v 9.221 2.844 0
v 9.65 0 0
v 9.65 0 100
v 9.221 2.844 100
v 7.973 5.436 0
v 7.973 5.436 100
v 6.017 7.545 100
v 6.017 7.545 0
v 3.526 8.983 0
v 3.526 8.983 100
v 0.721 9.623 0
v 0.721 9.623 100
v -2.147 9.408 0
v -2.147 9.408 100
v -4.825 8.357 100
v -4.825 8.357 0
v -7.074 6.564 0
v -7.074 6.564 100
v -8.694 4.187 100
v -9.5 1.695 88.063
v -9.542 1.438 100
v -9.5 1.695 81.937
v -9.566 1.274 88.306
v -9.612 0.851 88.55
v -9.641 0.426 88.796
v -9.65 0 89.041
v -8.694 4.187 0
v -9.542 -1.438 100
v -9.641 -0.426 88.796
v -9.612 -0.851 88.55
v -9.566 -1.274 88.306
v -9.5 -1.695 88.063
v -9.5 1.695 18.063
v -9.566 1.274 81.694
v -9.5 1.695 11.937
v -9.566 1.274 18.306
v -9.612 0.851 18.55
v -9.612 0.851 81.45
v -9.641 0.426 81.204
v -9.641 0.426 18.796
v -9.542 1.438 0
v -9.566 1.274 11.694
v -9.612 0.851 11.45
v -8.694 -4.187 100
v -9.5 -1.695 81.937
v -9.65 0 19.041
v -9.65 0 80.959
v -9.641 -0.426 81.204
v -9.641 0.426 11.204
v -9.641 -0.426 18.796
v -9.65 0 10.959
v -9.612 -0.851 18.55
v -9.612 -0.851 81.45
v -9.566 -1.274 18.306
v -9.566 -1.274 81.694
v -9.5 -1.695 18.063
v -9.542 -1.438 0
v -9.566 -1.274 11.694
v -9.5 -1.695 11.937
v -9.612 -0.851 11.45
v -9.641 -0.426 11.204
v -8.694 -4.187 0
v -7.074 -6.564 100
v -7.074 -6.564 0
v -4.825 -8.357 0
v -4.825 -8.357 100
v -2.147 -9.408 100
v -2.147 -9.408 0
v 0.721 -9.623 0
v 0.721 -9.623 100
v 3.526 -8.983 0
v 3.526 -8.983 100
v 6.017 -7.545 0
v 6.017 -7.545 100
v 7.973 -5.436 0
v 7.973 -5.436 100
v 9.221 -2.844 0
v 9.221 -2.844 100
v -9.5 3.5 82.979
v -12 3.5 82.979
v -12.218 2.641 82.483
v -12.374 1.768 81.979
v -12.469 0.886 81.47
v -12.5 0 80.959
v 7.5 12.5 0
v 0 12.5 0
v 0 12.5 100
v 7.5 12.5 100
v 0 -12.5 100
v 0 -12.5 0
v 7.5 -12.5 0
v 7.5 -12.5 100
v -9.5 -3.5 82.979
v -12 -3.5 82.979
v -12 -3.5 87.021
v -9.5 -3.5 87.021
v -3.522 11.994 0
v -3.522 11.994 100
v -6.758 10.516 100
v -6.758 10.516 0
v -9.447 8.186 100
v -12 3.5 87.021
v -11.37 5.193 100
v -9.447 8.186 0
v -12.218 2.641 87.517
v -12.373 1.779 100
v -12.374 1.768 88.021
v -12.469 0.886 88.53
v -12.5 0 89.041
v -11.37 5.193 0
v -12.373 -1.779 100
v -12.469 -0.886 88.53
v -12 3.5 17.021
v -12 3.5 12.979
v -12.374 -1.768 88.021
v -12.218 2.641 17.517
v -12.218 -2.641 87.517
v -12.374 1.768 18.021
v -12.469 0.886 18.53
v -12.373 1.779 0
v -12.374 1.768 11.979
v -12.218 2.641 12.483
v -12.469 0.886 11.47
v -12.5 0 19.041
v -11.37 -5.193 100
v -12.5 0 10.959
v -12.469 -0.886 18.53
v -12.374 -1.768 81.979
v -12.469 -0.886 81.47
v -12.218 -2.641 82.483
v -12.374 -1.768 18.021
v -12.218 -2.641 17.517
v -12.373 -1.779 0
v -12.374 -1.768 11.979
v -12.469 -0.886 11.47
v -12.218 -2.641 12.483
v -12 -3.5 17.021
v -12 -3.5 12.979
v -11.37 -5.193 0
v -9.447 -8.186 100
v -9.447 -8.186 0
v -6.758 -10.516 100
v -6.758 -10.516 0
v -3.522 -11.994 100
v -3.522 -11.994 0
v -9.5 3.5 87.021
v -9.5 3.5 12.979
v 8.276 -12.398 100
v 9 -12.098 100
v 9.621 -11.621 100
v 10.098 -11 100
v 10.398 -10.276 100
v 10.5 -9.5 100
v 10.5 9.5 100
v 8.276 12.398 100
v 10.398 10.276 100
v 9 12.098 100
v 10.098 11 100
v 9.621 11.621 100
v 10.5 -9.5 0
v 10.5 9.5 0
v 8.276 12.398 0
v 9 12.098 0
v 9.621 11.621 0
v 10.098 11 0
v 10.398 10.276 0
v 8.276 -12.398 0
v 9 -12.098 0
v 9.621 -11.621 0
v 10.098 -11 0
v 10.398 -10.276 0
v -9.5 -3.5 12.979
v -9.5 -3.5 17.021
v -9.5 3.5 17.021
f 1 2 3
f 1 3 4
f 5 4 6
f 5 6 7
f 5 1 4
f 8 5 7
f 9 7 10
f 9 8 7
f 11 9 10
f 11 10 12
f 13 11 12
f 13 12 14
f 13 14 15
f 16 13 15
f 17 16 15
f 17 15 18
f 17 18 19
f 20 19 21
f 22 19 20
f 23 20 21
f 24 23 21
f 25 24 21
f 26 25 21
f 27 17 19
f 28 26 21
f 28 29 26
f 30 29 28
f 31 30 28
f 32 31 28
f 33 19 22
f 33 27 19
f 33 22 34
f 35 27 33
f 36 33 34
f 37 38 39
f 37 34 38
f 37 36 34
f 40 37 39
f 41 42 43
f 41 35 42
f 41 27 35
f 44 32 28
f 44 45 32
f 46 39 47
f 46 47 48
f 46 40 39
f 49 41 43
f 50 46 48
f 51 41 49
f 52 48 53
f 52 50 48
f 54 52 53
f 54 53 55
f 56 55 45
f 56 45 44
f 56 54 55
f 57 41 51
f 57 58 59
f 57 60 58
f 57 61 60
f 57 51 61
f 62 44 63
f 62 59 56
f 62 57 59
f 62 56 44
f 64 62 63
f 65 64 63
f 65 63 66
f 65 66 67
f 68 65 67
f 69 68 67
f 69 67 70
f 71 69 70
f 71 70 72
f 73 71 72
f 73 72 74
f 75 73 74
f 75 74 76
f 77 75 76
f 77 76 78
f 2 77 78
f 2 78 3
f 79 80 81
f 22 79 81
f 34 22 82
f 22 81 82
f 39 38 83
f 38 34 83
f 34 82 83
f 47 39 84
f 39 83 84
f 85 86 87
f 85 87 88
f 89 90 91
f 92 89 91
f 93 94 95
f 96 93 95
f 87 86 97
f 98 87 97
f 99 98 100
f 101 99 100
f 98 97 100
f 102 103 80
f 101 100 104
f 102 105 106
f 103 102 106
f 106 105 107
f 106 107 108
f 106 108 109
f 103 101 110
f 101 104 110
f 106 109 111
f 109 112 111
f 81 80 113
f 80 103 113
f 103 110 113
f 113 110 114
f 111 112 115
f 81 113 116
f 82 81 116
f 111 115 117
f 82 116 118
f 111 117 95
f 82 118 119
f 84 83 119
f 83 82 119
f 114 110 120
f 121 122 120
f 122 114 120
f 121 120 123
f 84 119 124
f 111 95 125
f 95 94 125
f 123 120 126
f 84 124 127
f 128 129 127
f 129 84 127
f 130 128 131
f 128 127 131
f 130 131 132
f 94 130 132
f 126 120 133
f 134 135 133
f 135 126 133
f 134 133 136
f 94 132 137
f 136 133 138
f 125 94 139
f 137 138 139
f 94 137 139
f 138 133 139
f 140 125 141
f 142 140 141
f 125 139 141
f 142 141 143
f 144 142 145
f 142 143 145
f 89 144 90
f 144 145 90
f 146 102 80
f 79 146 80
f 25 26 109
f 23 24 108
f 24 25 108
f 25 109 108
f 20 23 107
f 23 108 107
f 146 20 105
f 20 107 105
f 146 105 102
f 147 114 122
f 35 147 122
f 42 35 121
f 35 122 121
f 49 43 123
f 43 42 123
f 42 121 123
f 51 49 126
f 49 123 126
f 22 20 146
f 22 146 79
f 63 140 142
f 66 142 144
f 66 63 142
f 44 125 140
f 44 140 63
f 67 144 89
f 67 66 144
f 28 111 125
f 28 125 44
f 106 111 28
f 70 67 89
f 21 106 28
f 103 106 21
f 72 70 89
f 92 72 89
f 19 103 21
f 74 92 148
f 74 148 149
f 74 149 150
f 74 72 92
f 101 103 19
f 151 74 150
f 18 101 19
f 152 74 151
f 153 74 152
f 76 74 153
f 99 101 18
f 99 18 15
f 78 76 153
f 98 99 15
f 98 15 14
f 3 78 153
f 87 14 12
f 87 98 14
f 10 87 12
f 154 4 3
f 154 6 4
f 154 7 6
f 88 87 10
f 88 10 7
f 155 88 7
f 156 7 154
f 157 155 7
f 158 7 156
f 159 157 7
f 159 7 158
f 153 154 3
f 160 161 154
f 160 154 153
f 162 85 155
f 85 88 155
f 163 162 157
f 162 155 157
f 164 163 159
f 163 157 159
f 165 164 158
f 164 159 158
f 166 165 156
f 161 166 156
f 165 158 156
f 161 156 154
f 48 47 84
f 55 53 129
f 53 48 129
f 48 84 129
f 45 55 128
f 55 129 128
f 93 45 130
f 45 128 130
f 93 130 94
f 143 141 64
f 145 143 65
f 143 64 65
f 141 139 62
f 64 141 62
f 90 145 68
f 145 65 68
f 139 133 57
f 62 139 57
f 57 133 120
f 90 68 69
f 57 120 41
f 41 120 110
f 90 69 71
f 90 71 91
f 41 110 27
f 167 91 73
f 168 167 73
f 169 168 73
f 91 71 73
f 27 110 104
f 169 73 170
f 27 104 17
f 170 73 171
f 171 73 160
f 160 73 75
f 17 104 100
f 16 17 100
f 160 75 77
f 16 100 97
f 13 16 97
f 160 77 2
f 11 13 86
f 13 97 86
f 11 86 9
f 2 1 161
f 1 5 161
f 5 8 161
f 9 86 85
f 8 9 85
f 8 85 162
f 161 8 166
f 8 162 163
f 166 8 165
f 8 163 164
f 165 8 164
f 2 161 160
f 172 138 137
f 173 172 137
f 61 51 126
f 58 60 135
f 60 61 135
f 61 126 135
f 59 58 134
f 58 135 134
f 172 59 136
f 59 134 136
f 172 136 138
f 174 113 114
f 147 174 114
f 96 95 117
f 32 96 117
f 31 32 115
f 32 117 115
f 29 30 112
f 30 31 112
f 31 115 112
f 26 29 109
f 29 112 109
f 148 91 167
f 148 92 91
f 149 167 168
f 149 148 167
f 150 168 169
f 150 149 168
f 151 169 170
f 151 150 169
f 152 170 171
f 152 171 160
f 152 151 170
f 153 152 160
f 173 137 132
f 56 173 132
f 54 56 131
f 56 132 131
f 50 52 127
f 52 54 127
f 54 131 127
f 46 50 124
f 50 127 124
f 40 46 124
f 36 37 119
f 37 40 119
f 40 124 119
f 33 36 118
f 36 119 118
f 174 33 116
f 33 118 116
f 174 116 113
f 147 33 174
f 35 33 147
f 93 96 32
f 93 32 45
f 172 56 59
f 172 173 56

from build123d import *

# Parameters (mm, degrees)
SKETCH_R     = 9.65
PAD_DEPTH    = 100
FILLET_R     = 3
POCKET_DEPTH = 3


with BuildPart() as part:
    # Sketch → Pad (new body)
    with BuildSketch(Plane.XY):
        with BuildLine():
            ThreePointArc((0, 12.5), (-12.5, 0), (0, -12.5))
            Line((0, -12.5), (10.5, -12.5))
            Line((10.5, 12.5), (10.5, -12.5))
            Line((0, 12.5), (10.5, 12.5))
        make_face()
        Circle(SKETCH_R, mode=Mode.SUBTRACT)
    extrude(amount=PAD_DEPTH)

    # Fillet
    fillet_edges = [part.edges().sort_by_distance(p)[0] for p in [
        (10.5, -12.5, 50),
        (10.5, 12.5, 50),
    ]]
    fillet(fillet_edges, radius=FILLET_R)

    # Sketch001 (on DatumPlane) → Pocket (cut)
    with BuildSketch(Plane(origin=(-12.5, 0, 100), x_dir=(0, 0, -1), z_dir=(-1, 0, 0))):
        Polygon((12.979274, -3.5), (17.020726, -3.5), (19.041452, 0), (17.020726, 3.5), (12.979274, 3.5), (10.958548, 0), align=None)
        Polygon((87.020726, -3.5), (89.041452, 0), (87.020726, 3.5), (82.979274, 3.5), (80.958548, 0), (82.979274, -3.5), align=None)
    extrude(amount=-POCKET_DEPTH, mode=Mode.SUBTRACT)


solid = part.part
